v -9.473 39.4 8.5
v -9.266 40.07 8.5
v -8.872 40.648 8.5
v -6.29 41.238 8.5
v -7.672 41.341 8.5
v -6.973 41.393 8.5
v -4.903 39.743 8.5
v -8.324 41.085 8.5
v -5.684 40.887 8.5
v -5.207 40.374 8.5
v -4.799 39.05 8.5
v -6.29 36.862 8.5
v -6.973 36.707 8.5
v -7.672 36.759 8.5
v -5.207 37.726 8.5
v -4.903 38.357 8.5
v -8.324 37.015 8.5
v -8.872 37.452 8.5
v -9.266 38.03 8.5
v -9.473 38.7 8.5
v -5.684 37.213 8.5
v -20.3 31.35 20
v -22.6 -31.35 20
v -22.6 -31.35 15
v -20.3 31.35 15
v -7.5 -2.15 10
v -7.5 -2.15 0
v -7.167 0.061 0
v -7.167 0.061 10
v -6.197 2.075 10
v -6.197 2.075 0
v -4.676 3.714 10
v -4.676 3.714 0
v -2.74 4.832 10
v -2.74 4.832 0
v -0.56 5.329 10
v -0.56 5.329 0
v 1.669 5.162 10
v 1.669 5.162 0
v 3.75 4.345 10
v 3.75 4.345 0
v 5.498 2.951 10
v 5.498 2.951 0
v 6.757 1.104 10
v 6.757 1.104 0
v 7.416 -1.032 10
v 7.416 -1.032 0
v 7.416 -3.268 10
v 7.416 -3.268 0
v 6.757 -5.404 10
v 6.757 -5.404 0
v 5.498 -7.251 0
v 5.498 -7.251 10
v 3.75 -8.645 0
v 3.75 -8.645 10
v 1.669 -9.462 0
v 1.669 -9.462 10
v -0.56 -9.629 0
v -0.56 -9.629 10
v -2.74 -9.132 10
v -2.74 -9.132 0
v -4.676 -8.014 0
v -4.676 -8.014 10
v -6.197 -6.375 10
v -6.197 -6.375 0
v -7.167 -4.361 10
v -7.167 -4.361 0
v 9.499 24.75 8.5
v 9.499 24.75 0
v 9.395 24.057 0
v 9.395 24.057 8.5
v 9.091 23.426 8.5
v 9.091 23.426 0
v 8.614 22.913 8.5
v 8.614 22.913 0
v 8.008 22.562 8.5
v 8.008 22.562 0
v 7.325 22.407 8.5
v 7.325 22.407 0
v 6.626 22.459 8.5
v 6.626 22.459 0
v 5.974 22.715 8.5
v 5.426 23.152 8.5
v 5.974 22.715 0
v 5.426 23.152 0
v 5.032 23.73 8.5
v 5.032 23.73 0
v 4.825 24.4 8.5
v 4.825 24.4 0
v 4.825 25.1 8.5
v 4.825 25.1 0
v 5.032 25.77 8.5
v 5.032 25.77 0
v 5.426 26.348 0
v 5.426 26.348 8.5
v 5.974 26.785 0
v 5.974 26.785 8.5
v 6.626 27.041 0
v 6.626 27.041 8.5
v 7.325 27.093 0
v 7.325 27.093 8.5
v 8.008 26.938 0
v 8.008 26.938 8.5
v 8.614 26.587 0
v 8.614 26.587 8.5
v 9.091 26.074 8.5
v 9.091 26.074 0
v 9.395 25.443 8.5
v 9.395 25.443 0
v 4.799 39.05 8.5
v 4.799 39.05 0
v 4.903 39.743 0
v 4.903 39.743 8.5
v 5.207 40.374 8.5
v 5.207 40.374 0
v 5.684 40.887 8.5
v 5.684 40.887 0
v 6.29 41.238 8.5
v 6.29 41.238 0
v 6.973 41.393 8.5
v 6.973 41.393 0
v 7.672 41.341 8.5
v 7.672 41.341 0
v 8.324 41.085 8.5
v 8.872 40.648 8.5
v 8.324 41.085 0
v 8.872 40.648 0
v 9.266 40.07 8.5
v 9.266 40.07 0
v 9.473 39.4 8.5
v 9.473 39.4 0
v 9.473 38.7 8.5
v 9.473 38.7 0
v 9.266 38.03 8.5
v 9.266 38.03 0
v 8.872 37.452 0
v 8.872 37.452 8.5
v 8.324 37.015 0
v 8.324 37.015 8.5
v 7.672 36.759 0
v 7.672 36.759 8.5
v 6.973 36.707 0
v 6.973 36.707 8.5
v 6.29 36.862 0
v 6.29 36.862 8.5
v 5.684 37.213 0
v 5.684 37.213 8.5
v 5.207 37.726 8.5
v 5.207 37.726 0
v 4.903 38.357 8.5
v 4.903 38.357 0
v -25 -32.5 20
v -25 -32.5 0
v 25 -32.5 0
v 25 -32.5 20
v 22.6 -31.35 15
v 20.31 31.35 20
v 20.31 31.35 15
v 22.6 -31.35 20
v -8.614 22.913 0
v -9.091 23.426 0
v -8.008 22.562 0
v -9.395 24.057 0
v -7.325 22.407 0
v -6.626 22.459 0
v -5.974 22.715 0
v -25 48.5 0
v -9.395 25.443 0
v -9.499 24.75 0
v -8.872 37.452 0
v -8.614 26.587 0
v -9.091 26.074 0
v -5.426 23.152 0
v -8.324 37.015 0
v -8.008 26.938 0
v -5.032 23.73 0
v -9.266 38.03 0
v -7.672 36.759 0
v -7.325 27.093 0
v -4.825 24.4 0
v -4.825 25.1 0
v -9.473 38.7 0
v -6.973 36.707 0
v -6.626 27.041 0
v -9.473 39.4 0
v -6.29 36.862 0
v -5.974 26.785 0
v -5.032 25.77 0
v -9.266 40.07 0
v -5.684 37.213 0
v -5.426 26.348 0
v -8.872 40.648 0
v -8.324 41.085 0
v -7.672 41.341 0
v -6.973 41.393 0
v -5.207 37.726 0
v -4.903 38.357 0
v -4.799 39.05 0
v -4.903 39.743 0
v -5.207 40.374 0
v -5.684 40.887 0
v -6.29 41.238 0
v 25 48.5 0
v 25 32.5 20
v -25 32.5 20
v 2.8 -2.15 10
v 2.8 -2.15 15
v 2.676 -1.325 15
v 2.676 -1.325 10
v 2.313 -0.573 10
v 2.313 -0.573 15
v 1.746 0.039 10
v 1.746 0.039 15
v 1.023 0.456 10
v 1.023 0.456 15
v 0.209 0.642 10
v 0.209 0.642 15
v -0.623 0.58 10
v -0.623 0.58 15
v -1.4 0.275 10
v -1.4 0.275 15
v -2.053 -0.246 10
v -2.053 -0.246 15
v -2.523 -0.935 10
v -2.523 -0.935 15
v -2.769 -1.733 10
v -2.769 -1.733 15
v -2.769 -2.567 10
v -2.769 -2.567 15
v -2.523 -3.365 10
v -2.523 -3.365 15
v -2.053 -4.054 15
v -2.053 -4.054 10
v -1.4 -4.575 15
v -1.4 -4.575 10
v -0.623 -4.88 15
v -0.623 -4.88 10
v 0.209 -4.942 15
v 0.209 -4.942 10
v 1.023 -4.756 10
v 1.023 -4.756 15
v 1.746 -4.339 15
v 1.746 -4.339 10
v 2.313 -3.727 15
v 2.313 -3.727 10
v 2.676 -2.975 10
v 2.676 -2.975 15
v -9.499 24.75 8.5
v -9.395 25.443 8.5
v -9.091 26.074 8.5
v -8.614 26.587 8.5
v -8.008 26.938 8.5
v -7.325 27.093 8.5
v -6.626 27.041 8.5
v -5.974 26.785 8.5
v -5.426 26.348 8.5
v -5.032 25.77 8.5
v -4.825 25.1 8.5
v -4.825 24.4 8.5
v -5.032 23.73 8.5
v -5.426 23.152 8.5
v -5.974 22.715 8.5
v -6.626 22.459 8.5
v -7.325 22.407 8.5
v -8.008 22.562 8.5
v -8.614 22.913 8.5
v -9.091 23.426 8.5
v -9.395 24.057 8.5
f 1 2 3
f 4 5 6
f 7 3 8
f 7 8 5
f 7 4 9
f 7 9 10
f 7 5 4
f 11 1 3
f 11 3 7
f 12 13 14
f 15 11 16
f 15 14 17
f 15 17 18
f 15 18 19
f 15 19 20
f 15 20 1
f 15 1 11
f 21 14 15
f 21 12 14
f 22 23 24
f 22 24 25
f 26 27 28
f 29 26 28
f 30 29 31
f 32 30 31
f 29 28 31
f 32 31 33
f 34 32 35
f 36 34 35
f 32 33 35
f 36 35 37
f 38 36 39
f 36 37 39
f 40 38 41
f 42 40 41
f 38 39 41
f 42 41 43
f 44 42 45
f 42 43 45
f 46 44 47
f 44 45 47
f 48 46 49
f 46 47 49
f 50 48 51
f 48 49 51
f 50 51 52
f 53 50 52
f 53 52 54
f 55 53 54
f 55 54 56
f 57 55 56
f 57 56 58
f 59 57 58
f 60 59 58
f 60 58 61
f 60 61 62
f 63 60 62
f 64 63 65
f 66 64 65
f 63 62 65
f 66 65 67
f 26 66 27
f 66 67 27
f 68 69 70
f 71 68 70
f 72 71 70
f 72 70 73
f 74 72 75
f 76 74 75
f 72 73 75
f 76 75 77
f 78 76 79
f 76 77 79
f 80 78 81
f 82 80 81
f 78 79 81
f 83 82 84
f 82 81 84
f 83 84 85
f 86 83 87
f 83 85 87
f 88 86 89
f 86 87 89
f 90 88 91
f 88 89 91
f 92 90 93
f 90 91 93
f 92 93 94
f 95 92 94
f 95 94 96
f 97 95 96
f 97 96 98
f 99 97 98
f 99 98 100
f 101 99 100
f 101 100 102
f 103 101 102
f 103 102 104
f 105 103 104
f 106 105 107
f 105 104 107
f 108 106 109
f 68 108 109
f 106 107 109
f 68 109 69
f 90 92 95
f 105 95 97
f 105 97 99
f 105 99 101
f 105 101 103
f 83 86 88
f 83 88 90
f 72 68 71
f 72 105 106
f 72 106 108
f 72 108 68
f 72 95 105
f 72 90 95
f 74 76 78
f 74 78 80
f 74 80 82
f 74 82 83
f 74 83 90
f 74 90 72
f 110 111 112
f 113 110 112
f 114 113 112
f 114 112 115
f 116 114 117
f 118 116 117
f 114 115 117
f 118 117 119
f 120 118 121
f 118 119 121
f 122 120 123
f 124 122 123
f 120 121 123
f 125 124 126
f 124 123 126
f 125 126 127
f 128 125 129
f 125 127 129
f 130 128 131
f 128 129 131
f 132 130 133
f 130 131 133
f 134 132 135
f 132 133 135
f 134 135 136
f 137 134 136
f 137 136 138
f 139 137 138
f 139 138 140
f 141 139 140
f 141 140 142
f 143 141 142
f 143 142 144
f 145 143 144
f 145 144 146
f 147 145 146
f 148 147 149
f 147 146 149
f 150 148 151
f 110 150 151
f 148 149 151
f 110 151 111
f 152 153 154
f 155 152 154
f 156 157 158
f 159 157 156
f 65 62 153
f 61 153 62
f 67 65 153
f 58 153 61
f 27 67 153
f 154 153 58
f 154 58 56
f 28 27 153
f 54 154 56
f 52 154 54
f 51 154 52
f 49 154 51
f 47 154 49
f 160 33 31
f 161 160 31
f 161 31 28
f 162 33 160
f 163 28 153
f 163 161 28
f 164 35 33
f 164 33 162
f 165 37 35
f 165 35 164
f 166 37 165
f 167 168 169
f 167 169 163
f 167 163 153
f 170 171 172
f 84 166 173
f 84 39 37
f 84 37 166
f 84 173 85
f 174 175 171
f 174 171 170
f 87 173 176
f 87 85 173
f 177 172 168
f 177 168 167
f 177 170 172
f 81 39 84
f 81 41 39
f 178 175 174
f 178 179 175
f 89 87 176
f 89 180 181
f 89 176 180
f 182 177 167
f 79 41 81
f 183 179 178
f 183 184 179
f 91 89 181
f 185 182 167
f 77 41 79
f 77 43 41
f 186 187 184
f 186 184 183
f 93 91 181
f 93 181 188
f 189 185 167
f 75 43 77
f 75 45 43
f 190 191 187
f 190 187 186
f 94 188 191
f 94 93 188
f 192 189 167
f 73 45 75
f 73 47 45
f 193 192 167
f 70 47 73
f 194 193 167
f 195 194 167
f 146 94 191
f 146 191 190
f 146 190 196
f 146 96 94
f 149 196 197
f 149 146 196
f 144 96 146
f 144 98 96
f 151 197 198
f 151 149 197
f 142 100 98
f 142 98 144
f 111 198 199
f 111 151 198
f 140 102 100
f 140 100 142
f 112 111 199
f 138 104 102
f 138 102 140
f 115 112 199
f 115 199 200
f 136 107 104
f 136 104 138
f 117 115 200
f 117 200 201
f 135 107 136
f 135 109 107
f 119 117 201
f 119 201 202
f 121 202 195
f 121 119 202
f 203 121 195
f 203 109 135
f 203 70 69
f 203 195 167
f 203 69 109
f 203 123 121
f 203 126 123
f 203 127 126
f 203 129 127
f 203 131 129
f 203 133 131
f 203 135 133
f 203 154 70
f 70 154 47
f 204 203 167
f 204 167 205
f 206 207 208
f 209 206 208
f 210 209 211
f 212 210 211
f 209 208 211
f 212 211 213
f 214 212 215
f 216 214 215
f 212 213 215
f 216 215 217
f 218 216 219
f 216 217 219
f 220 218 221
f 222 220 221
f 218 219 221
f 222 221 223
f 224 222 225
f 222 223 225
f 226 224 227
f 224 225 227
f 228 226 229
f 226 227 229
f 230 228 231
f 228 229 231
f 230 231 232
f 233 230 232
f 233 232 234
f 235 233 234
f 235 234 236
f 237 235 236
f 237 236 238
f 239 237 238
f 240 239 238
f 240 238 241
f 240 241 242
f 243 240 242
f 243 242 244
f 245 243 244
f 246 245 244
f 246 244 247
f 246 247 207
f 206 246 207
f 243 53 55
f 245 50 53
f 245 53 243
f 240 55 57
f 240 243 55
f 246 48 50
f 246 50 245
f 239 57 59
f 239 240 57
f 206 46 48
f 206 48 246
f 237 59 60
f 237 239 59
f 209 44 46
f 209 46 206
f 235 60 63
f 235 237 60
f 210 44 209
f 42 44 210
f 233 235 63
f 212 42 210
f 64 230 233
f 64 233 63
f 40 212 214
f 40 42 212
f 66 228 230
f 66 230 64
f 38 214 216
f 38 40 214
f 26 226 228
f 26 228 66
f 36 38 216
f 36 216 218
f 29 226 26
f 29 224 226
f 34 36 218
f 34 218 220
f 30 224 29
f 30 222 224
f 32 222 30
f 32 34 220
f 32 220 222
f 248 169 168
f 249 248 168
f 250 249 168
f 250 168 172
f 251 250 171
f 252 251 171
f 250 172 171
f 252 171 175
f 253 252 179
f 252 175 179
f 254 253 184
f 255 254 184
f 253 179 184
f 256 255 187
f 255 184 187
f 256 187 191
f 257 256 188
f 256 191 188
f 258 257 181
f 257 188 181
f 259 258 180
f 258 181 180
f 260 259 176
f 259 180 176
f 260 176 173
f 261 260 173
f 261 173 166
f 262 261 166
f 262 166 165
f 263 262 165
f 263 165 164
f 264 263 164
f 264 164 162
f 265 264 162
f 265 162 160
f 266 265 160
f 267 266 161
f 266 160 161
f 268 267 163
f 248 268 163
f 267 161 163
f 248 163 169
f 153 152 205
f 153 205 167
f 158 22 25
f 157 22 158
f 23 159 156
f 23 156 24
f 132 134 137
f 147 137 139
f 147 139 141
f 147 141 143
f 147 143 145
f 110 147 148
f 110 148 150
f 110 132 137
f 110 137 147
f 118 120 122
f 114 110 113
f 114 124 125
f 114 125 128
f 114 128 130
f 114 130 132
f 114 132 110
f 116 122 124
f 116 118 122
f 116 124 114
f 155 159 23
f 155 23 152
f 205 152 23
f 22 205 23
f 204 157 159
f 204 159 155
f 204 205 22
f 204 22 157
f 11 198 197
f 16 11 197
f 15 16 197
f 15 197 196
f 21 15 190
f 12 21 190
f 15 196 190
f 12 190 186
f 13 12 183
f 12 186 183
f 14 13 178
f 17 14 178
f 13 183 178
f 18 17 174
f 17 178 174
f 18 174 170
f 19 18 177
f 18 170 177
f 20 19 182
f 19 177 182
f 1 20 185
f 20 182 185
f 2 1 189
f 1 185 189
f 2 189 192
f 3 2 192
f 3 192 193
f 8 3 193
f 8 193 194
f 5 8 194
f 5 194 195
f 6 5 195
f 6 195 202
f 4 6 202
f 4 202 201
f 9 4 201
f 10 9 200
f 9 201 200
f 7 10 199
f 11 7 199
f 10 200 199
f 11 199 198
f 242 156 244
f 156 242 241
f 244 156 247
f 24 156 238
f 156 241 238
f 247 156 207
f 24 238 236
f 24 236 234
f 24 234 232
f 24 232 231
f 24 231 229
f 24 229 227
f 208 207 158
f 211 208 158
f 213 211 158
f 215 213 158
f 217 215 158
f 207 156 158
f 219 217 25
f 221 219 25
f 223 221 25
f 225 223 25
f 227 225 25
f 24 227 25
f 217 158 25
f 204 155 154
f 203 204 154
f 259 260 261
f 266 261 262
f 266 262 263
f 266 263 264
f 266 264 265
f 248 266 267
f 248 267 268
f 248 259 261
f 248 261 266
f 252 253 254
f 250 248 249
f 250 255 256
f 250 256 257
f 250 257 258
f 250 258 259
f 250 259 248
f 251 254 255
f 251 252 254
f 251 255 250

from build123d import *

# Parameters (mm, degrees)
SKICA1_W                 = 50
SKICA1_H                 = 65
P_IDAT_VYSUNUT_M1_DEPTH  = 20
P_IDAT_VYSUNUT_M2_DEPTH  = 50
ODEBRAT_VYSUNUT_M1_DEPTH = 5
SKICA8_R                 = 2.35
ODEBRAT_VYSUNUT_M4_DEPTH = 8.5
SKICA6_R                 = 2.8
ODEBRAT_VYSUNUT_M7_DEPTH = 10
SKICA7_R                 = 7.5
ODEBRAT_VYSUNUT_M8_DEPTH = 10


with BuildPart() as part:
    # Skica1 → Přidat vysunutím1 (new body)
    with BuildSketch(Plane.XY):
        Rectangle(SKICA1_W, SKICA1_H)
    extrude(amount=P_IDAT_VYSUNUT_M1_DEPTH)

    # Skica3 → Přidat vysunutím2 (add, through all)
    with BuildSketch(Plane(origin=(25, 0, 0), x_dir=(0, 0, -1), z_dir=(1, 0, 0))):
        Polygon((0, 32.5), (0, 48.5), (-20, 32.5), align=None)
    extrude(amount=-P_IDAT_VYSUNUT_M2_DEPTH)

    # Skica5 → Odebrat vysunutím1 (cut)
    with BuildSketch(Plane.XY.offset(20)):
        Polygon((-20.3, 31.35), (20.31, 31.35), (22.6, -31.35), (-22.6, -31.35), align=None)
    extrude(amount=-ODEBRAT_VYSUNUT_M1_DEPTH, mode=Mode.SUBTRACT)

    # Skica8 → Odebrat vysunutím4 (cut)
    with BuildSketch(Plane(origin=(0, 0, 0), x_dir=(-1, 0, 0), z_dir=(0, 0, -1))):
        with Locations((7.14901322, 24.75)):
            Circle(SKICA8_R)
        with Locations(Location((-7.14901322, 24.75, 0), (0, 0, 180))):
            Circle(SKICA8_R)
        with Locations(Location((7.14901322, 39.05, 0), (0, 0, 180))):
            Circle(SKICA8_R)
        with Locations((-7.14901322, 39.05)):
            Circle(SKICA8_R)
    extrude(amount=-ODEBRAT_VYSUNUT_M4_DEPTH, mode=Mode.SUBTRACT)

    # Skica6 → Odebrat vysunutím7 (cut)
    with BuildSketch(Plane.XY.offset(15)):
        with Locations((0, -2.15)):
            Circle(SKICA6_R)
    extrude(amount=-ODEBRAT_VYSUNUT_M7_DEPTH, mode=Mode.SUBTRACT)

    # Skica7 → Odebrat vysunutím8 (cut)
    with BuildSketch(Plane(origin=(0, 0, 0), x_dir=(-1, 0, 0), z_dir=(0, 0, -1))):
        with Locations((0, -2.15)):
            Circle(SKICA7_R)
    extrude(amount=-ODEBRAT_VYSUNUT_M8_DEPTH, mode=Mode.SUBTRACT)


solid = part.part
